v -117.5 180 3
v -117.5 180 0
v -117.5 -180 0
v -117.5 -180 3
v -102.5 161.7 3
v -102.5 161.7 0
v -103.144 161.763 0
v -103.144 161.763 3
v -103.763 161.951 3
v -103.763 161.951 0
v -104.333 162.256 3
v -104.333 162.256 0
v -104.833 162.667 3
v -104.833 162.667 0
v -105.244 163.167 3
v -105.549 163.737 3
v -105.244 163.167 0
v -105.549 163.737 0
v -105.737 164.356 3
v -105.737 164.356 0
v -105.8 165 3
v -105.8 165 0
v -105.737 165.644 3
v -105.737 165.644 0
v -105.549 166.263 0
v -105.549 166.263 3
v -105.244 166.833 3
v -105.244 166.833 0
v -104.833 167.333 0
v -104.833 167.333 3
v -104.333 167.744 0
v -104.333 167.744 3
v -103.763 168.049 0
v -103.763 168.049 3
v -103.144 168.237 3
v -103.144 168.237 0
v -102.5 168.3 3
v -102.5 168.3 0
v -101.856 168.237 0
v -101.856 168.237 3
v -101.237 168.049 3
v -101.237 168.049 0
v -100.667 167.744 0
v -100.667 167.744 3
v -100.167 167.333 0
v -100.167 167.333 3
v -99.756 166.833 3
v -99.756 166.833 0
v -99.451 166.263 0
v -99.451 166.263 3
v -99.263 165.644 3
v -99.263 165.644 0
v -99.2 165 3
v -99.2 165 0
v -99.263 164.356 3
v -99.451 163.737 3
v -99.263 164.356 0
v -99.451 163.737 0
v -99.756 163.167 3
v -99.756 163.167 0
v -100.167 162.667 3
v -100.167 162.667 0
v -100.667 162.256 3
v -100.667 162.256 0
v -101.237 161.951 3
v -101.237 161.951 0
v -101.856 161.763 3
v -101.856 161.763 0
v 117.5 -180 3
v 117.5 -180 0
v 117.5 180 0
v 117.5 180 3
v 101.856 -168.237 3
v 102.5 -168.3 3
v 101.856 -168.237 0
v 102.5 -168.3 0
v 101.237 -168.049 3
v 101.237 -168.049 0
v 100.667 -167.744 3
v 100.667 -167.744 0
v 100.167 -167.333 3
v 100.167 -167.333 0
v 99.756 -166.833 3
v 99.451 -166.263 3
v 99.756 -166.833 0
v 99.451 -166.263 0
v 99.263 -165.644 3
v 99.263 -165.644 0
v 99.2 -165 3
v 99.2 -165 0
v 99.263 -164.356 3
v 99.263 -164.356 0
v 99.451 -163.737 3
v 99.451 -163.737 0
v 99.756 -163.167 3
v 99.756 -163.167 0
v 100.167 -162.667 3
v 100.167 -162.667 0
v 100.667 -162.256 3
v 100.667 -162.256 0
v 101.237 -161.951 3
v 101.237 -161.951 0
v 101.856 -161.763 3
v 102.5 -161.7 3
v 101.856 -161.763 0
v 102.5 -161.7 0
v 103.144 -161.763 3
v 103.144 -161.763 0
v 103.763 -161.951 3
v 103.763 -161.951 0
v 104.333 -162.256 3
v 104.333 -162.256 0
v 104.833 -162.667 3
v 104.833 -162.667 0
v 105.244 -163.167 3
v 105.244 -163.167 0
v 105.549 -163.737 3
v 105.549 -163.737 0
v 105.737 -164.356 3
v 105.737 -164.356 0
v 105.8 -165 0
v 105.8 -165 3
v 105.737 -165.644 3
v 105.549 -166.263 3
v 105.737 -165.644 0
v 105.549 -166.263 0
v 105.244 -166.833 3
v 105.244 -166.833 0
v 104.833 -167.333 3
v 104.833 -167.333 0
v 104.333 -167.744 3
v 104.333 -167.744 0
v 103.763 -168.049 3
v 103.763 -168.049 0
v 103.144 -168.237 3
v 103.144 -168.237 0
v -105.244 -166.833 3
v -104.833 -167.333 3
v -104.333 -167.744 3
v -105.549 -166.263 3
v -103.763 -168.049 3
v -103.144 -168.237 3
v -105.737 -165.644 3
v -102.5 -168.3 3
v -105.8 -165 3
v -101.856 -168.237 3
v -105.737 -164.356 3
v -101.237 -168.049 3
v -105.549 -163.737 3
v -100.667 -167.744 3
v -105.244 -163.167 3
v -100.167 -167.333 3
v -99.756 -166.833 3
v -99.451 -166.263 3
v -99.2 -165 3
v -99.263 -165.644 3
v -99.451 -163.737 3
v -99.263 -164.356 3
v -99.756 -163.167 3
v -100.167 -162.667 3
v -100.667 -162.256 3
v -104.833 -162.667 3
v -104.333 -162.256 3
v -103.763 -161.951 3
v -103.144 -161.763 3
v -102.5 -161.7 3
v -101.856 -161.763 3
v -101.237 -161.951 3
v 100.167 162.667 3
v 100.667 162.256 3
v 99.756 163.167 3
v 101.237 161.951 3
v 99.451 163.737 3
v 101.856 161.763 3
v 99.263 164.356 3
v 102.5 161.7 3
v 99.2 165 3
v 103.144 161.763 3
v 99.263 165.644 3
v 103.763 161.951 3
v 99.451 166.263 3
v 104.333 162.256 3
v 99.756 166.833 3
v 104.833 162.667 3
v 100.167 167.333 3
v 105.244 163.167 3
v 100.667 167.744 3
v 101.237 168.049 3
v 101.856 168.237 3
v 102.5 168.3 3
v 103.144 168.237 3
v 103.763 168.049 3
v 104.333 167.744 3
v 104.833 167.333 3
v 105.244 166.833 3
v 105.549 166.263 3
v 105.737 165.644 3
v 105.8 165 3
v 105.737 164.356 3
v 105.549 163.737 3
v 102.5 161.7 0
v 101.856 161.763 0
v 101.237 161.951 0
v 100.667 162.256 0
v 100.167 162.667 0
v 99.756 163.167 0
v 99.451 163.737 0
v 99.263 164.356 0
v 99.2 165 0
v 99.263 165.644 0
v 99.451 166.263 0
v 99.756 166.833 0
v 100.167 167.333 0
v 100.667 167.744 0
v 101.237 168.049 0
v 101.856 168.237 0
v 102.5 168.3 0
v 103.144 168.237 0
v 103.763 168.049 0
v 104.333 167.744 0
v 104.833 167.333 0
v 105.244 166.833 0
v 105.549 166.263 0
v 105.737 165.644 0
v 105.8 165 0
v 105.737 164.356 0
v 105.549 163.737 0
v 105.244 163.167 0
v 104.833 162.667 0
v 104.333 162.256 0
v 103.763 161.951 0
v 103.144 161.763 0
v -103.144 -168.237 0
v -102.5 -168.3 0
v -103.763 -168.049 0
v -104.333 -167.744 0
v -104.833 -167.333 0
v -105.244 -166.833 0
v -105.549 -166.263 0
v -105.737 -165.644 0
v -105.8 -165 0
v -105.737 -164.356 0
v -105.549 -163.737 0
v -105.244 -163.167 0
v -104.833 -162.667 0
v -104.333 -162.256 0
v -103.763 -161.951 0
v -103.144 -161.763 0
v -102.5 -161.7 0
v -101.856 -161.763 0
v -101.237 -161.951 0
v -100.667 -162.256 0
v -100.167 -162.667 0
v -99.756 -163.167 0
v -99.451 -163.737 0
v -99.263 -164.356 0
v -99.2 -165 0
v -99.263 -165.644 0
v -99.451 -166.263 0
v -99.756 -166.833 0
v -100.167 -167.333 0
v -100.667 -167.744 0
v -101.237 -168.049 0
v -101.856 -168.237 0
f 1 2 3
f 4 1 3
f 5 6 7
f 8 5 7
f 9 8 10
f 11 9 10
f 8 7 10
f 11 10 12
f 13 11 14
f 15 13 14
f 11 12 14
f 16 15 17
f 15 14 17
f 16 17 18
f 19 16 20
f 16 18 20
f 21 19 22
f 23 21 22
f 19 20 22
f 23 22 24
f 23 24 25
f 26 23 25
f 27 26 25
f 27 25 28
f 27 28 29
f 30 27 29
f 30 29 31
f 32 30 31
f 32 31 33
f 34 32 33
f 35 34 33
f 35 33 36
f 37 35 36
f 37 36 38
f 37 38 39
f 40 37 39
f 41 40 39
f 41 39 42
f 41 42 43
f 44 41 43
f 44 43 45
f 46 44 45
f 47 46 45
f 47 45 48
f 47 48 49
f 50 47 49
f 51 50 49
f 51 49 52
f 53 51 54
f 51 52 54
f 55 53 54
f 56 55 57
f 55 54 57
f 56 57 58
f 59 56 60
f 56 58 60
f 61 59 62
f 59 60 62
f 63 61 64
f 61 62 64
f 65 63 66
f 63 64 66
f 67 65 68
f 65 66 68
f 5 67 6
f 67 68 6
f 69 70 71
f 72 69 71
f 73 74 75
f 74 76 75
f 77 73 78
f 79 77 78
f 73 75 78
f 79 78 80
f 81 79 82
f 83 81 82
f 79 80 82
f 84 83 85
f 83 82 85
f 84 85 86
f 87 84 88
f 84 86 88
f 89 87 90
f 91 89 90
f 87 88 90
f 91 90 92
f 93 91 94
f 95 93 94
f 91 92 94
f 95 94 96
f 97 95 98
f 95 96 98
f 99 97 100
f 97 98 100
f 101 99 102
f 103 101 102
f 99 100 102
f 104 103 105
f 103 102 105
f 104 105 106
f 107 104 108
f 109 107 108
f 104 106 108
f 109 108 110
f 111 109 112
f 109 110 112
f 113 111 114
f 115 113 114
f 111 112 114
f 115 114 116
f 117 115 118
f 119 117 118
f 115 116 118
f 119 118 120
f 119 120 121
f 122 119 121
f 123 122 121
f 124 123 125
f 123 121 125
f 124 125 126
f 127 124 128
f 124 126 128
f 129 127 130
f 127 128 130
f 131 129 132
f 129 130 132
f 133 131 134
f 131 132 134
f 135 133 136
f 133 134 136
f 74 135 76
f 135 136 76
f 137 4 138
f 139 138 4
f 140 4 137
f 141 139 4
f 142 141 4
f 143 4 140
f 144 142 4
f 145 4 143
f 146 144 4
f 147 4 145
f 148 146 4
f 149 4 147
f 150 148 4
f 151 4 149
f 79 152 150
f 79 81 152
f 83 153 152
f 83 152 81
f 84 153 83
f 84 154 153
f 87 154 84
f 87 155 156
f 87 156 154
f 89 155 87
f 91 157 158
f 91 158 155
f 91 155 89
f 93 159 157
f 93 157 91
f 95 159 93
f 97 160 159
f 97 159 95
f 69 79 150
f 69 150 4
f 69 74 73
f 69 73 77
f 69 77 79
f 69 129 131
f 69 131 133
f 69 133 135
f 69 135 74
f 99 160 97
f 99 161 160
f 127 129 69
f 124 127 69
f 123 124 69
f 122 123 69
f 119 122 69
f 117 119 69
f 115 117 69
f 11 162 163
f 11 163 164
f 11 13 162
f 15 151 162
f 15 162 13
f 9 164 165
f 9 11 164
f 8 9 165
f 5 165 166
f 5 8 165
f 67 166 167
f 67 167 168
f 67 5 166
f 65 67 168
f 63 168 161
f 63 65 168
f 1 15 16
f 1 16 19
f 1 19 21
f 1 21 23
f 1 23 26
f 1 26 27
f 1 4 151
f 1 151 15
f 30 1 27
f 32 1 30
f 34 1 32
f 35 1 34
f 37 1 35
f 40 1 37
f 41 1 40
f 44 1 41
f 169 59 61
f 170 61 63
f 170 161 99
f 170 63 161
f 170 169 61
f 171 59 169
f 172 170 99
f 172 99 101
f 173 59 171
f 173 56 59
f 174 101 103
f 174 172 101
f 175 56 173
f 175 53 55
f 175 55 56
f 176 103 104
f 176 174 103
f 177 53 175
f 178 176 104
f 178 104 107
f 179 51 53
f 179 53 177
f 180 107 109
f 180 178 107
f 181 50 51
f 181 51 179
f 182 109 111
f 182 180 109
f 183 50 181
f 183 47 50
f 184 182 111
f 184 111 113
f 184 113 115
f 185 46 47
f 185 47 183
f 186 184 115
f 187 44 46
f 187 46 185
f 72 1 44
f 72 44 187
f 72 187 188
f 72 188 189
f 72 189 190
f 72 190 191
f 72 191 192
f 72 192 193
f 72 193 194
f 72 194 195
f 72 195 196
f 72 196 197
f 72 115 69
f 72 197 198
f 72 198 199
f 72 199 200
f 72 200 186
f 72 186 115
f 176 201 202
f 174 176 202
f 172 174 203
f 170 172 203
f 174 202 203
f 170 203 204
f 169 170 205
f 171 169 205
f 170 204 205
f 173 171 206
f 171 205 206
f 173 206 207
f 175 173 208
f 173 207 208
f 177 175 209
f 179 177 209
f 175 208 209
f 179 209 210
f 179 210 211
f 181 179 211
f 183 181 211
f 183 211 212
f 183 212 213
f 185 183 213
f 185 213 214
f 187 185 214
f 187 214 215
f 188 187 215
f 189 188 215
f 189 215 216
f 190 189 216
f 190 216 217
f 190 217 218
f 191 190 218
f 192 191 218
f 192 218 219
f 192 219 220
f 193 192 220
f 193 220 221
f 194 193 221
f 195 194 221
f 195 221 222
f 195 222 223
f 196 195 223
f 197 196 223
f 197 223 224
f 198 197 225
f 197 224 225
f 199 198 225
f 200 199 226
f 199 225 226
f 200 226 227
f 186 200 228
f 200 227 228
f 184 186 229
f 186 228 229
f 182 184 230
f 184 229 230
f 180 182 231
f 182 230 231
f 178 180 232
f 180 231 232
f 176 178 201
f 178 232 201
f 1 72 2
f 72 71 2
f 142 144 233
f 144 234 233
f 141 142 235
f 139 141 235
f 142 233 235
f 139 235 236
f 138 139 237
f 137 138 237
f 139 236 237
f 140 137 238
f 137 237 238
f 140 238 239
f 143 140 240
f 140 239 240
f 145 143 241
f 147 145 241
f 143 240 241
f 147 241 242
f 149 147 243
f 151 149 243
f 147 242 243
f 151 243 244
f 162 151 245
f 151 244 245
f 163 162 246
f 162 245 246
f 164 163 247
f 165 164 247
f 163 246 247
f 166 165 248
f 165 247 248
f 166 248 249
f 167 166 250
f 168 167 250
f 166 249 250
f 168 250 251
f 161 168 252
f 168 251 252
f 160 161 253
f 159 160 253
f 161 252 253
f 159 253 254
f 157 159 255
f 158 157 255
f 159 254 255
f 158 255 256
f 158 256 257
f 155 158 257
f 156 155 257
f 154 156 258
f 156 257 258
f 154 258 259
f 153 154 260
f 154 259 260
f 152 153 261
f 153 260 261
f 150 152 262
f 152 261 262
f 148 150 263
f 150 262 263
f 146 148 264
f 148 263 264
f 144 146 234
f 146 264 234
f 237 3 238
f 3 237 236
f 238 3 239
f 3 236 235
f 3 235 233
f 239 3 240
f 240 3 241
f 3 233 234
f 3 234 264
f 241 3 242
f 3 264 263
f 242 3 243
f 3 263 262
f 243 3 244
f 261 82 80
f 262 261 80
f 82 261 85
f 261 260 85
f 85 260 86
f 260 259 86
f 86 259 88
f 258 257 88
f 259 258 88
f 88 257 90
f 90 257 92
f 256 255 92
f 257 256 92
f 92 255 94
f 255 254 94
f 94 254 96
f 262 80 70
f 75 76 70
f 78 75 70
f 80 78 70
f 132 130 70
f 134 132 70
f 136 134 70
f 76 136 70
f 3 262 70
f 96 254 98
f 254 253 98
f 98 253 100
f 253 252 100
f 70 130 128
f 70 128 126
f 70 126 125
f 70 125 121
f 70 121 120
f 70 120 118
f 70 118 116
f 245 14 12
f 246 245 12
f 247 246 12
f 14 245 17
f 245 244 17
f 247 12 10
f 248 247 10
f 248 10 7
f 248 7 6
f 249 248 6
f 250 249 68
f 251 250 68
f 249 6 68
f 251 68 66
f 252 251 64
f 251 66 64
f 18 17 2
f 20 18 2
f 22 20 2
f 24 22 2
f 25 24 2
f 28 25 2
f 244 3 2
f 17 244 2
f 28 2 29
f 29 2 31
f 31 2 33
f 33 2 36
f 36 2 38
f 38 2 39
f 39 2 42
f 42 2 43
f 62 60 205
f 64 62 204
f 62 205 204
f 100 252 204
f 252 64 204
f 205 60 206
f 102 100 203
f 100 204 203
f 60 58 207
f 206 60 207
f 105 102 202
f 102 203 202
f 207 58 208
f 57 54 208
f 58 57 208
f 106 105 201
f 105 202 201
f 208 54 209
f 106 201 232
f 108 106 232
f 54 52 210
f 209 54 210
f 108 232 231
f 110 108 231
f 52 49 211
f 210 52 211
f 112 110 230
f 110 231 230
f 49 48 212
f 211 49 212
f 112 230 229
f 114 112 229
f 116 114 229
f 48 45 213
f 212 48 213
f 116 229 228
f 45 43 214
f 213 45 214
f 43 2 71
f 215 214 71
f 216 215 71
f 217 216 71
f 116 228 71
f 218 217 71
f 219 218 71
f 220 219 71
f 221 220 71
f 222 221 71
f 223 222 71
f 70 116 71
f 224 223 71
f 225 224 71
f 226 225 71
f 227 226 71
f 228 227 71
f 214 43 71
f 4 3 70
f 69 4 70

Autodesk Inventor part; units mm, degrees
ref_plane "YZ Plane" through (0, 0, 0) normal (1, 0, 0) x (0, 1, 0)
ref_plane "XZ Plane" through (0, 0, 0) normal (0, 1, 0) x (-1, 0, 0)
ref_plane "XY Plane" through (0, 0, 0) normal (0, 0, 1) x (1, 0, 0)
sketch "スケッチ2" plane through (0, 0, 0) normal (0, 0, 1) x (1, 0, 0)
  line L0 (117.5, 180) -> (-117.5, 180)
  line L1 (-117.5, 180) -> (-117.5, -180)
  line L2 (-117.5, -180) -> (117.5, -180)
  line L3 (117.5, -180) -> (117.5, 180)
  line L4 (117.5, 180) -> (-117.5, -180) construction
  line L5 (-117.5, 180) -> (117.5, -180) construction
  point P0 (0, 0)
  dimension "d0" = 235
  dimension "d1" = 360
extrude "押し出し1" add sketch "スケッチ2" along normal blind 3
sketch "スケッチ3" plane through (0, 0, 3) normal (0, 0, 1) x (1, 0, 0)
  line L0 (-117.5, 180) -> (-117.5, -180) construction
  line L1 (-117.5, -180) -> (117.5, -180) construction
  line L2 (117.5, -180) -> (117.5, 180) construction
  line L3 (117.5, 180) -> (-117.5, 180) construction
  line L4 (102.5, 165) -> (-102.5, 165) construction
  line L5 (-102.5, 165) -> (-102.5, -165) construction
  line L6 (-102.5, -165) -> (102.5, -165) construction
  line L7 (102.5, -165) -> (102.5, 165) construction
  line L8 (102.5, 165) -> (-102.5, -165) construction
  line L9 (-102.5, 165) -> (102.5, -165) construction
  point P0 (0, 0)
  dimension "d4" = 15
  dimension "d5" = 15
hole "穴1" at (-102.5, 165, 3) at (102.5, 165, 3) at (102.5, -165, 3) at (-102.5, -165, 3) direction (0, 0, -1) diameter 6.6 end through all
equation "\"d5\" = d4"
properties part number "bottom_panel"
